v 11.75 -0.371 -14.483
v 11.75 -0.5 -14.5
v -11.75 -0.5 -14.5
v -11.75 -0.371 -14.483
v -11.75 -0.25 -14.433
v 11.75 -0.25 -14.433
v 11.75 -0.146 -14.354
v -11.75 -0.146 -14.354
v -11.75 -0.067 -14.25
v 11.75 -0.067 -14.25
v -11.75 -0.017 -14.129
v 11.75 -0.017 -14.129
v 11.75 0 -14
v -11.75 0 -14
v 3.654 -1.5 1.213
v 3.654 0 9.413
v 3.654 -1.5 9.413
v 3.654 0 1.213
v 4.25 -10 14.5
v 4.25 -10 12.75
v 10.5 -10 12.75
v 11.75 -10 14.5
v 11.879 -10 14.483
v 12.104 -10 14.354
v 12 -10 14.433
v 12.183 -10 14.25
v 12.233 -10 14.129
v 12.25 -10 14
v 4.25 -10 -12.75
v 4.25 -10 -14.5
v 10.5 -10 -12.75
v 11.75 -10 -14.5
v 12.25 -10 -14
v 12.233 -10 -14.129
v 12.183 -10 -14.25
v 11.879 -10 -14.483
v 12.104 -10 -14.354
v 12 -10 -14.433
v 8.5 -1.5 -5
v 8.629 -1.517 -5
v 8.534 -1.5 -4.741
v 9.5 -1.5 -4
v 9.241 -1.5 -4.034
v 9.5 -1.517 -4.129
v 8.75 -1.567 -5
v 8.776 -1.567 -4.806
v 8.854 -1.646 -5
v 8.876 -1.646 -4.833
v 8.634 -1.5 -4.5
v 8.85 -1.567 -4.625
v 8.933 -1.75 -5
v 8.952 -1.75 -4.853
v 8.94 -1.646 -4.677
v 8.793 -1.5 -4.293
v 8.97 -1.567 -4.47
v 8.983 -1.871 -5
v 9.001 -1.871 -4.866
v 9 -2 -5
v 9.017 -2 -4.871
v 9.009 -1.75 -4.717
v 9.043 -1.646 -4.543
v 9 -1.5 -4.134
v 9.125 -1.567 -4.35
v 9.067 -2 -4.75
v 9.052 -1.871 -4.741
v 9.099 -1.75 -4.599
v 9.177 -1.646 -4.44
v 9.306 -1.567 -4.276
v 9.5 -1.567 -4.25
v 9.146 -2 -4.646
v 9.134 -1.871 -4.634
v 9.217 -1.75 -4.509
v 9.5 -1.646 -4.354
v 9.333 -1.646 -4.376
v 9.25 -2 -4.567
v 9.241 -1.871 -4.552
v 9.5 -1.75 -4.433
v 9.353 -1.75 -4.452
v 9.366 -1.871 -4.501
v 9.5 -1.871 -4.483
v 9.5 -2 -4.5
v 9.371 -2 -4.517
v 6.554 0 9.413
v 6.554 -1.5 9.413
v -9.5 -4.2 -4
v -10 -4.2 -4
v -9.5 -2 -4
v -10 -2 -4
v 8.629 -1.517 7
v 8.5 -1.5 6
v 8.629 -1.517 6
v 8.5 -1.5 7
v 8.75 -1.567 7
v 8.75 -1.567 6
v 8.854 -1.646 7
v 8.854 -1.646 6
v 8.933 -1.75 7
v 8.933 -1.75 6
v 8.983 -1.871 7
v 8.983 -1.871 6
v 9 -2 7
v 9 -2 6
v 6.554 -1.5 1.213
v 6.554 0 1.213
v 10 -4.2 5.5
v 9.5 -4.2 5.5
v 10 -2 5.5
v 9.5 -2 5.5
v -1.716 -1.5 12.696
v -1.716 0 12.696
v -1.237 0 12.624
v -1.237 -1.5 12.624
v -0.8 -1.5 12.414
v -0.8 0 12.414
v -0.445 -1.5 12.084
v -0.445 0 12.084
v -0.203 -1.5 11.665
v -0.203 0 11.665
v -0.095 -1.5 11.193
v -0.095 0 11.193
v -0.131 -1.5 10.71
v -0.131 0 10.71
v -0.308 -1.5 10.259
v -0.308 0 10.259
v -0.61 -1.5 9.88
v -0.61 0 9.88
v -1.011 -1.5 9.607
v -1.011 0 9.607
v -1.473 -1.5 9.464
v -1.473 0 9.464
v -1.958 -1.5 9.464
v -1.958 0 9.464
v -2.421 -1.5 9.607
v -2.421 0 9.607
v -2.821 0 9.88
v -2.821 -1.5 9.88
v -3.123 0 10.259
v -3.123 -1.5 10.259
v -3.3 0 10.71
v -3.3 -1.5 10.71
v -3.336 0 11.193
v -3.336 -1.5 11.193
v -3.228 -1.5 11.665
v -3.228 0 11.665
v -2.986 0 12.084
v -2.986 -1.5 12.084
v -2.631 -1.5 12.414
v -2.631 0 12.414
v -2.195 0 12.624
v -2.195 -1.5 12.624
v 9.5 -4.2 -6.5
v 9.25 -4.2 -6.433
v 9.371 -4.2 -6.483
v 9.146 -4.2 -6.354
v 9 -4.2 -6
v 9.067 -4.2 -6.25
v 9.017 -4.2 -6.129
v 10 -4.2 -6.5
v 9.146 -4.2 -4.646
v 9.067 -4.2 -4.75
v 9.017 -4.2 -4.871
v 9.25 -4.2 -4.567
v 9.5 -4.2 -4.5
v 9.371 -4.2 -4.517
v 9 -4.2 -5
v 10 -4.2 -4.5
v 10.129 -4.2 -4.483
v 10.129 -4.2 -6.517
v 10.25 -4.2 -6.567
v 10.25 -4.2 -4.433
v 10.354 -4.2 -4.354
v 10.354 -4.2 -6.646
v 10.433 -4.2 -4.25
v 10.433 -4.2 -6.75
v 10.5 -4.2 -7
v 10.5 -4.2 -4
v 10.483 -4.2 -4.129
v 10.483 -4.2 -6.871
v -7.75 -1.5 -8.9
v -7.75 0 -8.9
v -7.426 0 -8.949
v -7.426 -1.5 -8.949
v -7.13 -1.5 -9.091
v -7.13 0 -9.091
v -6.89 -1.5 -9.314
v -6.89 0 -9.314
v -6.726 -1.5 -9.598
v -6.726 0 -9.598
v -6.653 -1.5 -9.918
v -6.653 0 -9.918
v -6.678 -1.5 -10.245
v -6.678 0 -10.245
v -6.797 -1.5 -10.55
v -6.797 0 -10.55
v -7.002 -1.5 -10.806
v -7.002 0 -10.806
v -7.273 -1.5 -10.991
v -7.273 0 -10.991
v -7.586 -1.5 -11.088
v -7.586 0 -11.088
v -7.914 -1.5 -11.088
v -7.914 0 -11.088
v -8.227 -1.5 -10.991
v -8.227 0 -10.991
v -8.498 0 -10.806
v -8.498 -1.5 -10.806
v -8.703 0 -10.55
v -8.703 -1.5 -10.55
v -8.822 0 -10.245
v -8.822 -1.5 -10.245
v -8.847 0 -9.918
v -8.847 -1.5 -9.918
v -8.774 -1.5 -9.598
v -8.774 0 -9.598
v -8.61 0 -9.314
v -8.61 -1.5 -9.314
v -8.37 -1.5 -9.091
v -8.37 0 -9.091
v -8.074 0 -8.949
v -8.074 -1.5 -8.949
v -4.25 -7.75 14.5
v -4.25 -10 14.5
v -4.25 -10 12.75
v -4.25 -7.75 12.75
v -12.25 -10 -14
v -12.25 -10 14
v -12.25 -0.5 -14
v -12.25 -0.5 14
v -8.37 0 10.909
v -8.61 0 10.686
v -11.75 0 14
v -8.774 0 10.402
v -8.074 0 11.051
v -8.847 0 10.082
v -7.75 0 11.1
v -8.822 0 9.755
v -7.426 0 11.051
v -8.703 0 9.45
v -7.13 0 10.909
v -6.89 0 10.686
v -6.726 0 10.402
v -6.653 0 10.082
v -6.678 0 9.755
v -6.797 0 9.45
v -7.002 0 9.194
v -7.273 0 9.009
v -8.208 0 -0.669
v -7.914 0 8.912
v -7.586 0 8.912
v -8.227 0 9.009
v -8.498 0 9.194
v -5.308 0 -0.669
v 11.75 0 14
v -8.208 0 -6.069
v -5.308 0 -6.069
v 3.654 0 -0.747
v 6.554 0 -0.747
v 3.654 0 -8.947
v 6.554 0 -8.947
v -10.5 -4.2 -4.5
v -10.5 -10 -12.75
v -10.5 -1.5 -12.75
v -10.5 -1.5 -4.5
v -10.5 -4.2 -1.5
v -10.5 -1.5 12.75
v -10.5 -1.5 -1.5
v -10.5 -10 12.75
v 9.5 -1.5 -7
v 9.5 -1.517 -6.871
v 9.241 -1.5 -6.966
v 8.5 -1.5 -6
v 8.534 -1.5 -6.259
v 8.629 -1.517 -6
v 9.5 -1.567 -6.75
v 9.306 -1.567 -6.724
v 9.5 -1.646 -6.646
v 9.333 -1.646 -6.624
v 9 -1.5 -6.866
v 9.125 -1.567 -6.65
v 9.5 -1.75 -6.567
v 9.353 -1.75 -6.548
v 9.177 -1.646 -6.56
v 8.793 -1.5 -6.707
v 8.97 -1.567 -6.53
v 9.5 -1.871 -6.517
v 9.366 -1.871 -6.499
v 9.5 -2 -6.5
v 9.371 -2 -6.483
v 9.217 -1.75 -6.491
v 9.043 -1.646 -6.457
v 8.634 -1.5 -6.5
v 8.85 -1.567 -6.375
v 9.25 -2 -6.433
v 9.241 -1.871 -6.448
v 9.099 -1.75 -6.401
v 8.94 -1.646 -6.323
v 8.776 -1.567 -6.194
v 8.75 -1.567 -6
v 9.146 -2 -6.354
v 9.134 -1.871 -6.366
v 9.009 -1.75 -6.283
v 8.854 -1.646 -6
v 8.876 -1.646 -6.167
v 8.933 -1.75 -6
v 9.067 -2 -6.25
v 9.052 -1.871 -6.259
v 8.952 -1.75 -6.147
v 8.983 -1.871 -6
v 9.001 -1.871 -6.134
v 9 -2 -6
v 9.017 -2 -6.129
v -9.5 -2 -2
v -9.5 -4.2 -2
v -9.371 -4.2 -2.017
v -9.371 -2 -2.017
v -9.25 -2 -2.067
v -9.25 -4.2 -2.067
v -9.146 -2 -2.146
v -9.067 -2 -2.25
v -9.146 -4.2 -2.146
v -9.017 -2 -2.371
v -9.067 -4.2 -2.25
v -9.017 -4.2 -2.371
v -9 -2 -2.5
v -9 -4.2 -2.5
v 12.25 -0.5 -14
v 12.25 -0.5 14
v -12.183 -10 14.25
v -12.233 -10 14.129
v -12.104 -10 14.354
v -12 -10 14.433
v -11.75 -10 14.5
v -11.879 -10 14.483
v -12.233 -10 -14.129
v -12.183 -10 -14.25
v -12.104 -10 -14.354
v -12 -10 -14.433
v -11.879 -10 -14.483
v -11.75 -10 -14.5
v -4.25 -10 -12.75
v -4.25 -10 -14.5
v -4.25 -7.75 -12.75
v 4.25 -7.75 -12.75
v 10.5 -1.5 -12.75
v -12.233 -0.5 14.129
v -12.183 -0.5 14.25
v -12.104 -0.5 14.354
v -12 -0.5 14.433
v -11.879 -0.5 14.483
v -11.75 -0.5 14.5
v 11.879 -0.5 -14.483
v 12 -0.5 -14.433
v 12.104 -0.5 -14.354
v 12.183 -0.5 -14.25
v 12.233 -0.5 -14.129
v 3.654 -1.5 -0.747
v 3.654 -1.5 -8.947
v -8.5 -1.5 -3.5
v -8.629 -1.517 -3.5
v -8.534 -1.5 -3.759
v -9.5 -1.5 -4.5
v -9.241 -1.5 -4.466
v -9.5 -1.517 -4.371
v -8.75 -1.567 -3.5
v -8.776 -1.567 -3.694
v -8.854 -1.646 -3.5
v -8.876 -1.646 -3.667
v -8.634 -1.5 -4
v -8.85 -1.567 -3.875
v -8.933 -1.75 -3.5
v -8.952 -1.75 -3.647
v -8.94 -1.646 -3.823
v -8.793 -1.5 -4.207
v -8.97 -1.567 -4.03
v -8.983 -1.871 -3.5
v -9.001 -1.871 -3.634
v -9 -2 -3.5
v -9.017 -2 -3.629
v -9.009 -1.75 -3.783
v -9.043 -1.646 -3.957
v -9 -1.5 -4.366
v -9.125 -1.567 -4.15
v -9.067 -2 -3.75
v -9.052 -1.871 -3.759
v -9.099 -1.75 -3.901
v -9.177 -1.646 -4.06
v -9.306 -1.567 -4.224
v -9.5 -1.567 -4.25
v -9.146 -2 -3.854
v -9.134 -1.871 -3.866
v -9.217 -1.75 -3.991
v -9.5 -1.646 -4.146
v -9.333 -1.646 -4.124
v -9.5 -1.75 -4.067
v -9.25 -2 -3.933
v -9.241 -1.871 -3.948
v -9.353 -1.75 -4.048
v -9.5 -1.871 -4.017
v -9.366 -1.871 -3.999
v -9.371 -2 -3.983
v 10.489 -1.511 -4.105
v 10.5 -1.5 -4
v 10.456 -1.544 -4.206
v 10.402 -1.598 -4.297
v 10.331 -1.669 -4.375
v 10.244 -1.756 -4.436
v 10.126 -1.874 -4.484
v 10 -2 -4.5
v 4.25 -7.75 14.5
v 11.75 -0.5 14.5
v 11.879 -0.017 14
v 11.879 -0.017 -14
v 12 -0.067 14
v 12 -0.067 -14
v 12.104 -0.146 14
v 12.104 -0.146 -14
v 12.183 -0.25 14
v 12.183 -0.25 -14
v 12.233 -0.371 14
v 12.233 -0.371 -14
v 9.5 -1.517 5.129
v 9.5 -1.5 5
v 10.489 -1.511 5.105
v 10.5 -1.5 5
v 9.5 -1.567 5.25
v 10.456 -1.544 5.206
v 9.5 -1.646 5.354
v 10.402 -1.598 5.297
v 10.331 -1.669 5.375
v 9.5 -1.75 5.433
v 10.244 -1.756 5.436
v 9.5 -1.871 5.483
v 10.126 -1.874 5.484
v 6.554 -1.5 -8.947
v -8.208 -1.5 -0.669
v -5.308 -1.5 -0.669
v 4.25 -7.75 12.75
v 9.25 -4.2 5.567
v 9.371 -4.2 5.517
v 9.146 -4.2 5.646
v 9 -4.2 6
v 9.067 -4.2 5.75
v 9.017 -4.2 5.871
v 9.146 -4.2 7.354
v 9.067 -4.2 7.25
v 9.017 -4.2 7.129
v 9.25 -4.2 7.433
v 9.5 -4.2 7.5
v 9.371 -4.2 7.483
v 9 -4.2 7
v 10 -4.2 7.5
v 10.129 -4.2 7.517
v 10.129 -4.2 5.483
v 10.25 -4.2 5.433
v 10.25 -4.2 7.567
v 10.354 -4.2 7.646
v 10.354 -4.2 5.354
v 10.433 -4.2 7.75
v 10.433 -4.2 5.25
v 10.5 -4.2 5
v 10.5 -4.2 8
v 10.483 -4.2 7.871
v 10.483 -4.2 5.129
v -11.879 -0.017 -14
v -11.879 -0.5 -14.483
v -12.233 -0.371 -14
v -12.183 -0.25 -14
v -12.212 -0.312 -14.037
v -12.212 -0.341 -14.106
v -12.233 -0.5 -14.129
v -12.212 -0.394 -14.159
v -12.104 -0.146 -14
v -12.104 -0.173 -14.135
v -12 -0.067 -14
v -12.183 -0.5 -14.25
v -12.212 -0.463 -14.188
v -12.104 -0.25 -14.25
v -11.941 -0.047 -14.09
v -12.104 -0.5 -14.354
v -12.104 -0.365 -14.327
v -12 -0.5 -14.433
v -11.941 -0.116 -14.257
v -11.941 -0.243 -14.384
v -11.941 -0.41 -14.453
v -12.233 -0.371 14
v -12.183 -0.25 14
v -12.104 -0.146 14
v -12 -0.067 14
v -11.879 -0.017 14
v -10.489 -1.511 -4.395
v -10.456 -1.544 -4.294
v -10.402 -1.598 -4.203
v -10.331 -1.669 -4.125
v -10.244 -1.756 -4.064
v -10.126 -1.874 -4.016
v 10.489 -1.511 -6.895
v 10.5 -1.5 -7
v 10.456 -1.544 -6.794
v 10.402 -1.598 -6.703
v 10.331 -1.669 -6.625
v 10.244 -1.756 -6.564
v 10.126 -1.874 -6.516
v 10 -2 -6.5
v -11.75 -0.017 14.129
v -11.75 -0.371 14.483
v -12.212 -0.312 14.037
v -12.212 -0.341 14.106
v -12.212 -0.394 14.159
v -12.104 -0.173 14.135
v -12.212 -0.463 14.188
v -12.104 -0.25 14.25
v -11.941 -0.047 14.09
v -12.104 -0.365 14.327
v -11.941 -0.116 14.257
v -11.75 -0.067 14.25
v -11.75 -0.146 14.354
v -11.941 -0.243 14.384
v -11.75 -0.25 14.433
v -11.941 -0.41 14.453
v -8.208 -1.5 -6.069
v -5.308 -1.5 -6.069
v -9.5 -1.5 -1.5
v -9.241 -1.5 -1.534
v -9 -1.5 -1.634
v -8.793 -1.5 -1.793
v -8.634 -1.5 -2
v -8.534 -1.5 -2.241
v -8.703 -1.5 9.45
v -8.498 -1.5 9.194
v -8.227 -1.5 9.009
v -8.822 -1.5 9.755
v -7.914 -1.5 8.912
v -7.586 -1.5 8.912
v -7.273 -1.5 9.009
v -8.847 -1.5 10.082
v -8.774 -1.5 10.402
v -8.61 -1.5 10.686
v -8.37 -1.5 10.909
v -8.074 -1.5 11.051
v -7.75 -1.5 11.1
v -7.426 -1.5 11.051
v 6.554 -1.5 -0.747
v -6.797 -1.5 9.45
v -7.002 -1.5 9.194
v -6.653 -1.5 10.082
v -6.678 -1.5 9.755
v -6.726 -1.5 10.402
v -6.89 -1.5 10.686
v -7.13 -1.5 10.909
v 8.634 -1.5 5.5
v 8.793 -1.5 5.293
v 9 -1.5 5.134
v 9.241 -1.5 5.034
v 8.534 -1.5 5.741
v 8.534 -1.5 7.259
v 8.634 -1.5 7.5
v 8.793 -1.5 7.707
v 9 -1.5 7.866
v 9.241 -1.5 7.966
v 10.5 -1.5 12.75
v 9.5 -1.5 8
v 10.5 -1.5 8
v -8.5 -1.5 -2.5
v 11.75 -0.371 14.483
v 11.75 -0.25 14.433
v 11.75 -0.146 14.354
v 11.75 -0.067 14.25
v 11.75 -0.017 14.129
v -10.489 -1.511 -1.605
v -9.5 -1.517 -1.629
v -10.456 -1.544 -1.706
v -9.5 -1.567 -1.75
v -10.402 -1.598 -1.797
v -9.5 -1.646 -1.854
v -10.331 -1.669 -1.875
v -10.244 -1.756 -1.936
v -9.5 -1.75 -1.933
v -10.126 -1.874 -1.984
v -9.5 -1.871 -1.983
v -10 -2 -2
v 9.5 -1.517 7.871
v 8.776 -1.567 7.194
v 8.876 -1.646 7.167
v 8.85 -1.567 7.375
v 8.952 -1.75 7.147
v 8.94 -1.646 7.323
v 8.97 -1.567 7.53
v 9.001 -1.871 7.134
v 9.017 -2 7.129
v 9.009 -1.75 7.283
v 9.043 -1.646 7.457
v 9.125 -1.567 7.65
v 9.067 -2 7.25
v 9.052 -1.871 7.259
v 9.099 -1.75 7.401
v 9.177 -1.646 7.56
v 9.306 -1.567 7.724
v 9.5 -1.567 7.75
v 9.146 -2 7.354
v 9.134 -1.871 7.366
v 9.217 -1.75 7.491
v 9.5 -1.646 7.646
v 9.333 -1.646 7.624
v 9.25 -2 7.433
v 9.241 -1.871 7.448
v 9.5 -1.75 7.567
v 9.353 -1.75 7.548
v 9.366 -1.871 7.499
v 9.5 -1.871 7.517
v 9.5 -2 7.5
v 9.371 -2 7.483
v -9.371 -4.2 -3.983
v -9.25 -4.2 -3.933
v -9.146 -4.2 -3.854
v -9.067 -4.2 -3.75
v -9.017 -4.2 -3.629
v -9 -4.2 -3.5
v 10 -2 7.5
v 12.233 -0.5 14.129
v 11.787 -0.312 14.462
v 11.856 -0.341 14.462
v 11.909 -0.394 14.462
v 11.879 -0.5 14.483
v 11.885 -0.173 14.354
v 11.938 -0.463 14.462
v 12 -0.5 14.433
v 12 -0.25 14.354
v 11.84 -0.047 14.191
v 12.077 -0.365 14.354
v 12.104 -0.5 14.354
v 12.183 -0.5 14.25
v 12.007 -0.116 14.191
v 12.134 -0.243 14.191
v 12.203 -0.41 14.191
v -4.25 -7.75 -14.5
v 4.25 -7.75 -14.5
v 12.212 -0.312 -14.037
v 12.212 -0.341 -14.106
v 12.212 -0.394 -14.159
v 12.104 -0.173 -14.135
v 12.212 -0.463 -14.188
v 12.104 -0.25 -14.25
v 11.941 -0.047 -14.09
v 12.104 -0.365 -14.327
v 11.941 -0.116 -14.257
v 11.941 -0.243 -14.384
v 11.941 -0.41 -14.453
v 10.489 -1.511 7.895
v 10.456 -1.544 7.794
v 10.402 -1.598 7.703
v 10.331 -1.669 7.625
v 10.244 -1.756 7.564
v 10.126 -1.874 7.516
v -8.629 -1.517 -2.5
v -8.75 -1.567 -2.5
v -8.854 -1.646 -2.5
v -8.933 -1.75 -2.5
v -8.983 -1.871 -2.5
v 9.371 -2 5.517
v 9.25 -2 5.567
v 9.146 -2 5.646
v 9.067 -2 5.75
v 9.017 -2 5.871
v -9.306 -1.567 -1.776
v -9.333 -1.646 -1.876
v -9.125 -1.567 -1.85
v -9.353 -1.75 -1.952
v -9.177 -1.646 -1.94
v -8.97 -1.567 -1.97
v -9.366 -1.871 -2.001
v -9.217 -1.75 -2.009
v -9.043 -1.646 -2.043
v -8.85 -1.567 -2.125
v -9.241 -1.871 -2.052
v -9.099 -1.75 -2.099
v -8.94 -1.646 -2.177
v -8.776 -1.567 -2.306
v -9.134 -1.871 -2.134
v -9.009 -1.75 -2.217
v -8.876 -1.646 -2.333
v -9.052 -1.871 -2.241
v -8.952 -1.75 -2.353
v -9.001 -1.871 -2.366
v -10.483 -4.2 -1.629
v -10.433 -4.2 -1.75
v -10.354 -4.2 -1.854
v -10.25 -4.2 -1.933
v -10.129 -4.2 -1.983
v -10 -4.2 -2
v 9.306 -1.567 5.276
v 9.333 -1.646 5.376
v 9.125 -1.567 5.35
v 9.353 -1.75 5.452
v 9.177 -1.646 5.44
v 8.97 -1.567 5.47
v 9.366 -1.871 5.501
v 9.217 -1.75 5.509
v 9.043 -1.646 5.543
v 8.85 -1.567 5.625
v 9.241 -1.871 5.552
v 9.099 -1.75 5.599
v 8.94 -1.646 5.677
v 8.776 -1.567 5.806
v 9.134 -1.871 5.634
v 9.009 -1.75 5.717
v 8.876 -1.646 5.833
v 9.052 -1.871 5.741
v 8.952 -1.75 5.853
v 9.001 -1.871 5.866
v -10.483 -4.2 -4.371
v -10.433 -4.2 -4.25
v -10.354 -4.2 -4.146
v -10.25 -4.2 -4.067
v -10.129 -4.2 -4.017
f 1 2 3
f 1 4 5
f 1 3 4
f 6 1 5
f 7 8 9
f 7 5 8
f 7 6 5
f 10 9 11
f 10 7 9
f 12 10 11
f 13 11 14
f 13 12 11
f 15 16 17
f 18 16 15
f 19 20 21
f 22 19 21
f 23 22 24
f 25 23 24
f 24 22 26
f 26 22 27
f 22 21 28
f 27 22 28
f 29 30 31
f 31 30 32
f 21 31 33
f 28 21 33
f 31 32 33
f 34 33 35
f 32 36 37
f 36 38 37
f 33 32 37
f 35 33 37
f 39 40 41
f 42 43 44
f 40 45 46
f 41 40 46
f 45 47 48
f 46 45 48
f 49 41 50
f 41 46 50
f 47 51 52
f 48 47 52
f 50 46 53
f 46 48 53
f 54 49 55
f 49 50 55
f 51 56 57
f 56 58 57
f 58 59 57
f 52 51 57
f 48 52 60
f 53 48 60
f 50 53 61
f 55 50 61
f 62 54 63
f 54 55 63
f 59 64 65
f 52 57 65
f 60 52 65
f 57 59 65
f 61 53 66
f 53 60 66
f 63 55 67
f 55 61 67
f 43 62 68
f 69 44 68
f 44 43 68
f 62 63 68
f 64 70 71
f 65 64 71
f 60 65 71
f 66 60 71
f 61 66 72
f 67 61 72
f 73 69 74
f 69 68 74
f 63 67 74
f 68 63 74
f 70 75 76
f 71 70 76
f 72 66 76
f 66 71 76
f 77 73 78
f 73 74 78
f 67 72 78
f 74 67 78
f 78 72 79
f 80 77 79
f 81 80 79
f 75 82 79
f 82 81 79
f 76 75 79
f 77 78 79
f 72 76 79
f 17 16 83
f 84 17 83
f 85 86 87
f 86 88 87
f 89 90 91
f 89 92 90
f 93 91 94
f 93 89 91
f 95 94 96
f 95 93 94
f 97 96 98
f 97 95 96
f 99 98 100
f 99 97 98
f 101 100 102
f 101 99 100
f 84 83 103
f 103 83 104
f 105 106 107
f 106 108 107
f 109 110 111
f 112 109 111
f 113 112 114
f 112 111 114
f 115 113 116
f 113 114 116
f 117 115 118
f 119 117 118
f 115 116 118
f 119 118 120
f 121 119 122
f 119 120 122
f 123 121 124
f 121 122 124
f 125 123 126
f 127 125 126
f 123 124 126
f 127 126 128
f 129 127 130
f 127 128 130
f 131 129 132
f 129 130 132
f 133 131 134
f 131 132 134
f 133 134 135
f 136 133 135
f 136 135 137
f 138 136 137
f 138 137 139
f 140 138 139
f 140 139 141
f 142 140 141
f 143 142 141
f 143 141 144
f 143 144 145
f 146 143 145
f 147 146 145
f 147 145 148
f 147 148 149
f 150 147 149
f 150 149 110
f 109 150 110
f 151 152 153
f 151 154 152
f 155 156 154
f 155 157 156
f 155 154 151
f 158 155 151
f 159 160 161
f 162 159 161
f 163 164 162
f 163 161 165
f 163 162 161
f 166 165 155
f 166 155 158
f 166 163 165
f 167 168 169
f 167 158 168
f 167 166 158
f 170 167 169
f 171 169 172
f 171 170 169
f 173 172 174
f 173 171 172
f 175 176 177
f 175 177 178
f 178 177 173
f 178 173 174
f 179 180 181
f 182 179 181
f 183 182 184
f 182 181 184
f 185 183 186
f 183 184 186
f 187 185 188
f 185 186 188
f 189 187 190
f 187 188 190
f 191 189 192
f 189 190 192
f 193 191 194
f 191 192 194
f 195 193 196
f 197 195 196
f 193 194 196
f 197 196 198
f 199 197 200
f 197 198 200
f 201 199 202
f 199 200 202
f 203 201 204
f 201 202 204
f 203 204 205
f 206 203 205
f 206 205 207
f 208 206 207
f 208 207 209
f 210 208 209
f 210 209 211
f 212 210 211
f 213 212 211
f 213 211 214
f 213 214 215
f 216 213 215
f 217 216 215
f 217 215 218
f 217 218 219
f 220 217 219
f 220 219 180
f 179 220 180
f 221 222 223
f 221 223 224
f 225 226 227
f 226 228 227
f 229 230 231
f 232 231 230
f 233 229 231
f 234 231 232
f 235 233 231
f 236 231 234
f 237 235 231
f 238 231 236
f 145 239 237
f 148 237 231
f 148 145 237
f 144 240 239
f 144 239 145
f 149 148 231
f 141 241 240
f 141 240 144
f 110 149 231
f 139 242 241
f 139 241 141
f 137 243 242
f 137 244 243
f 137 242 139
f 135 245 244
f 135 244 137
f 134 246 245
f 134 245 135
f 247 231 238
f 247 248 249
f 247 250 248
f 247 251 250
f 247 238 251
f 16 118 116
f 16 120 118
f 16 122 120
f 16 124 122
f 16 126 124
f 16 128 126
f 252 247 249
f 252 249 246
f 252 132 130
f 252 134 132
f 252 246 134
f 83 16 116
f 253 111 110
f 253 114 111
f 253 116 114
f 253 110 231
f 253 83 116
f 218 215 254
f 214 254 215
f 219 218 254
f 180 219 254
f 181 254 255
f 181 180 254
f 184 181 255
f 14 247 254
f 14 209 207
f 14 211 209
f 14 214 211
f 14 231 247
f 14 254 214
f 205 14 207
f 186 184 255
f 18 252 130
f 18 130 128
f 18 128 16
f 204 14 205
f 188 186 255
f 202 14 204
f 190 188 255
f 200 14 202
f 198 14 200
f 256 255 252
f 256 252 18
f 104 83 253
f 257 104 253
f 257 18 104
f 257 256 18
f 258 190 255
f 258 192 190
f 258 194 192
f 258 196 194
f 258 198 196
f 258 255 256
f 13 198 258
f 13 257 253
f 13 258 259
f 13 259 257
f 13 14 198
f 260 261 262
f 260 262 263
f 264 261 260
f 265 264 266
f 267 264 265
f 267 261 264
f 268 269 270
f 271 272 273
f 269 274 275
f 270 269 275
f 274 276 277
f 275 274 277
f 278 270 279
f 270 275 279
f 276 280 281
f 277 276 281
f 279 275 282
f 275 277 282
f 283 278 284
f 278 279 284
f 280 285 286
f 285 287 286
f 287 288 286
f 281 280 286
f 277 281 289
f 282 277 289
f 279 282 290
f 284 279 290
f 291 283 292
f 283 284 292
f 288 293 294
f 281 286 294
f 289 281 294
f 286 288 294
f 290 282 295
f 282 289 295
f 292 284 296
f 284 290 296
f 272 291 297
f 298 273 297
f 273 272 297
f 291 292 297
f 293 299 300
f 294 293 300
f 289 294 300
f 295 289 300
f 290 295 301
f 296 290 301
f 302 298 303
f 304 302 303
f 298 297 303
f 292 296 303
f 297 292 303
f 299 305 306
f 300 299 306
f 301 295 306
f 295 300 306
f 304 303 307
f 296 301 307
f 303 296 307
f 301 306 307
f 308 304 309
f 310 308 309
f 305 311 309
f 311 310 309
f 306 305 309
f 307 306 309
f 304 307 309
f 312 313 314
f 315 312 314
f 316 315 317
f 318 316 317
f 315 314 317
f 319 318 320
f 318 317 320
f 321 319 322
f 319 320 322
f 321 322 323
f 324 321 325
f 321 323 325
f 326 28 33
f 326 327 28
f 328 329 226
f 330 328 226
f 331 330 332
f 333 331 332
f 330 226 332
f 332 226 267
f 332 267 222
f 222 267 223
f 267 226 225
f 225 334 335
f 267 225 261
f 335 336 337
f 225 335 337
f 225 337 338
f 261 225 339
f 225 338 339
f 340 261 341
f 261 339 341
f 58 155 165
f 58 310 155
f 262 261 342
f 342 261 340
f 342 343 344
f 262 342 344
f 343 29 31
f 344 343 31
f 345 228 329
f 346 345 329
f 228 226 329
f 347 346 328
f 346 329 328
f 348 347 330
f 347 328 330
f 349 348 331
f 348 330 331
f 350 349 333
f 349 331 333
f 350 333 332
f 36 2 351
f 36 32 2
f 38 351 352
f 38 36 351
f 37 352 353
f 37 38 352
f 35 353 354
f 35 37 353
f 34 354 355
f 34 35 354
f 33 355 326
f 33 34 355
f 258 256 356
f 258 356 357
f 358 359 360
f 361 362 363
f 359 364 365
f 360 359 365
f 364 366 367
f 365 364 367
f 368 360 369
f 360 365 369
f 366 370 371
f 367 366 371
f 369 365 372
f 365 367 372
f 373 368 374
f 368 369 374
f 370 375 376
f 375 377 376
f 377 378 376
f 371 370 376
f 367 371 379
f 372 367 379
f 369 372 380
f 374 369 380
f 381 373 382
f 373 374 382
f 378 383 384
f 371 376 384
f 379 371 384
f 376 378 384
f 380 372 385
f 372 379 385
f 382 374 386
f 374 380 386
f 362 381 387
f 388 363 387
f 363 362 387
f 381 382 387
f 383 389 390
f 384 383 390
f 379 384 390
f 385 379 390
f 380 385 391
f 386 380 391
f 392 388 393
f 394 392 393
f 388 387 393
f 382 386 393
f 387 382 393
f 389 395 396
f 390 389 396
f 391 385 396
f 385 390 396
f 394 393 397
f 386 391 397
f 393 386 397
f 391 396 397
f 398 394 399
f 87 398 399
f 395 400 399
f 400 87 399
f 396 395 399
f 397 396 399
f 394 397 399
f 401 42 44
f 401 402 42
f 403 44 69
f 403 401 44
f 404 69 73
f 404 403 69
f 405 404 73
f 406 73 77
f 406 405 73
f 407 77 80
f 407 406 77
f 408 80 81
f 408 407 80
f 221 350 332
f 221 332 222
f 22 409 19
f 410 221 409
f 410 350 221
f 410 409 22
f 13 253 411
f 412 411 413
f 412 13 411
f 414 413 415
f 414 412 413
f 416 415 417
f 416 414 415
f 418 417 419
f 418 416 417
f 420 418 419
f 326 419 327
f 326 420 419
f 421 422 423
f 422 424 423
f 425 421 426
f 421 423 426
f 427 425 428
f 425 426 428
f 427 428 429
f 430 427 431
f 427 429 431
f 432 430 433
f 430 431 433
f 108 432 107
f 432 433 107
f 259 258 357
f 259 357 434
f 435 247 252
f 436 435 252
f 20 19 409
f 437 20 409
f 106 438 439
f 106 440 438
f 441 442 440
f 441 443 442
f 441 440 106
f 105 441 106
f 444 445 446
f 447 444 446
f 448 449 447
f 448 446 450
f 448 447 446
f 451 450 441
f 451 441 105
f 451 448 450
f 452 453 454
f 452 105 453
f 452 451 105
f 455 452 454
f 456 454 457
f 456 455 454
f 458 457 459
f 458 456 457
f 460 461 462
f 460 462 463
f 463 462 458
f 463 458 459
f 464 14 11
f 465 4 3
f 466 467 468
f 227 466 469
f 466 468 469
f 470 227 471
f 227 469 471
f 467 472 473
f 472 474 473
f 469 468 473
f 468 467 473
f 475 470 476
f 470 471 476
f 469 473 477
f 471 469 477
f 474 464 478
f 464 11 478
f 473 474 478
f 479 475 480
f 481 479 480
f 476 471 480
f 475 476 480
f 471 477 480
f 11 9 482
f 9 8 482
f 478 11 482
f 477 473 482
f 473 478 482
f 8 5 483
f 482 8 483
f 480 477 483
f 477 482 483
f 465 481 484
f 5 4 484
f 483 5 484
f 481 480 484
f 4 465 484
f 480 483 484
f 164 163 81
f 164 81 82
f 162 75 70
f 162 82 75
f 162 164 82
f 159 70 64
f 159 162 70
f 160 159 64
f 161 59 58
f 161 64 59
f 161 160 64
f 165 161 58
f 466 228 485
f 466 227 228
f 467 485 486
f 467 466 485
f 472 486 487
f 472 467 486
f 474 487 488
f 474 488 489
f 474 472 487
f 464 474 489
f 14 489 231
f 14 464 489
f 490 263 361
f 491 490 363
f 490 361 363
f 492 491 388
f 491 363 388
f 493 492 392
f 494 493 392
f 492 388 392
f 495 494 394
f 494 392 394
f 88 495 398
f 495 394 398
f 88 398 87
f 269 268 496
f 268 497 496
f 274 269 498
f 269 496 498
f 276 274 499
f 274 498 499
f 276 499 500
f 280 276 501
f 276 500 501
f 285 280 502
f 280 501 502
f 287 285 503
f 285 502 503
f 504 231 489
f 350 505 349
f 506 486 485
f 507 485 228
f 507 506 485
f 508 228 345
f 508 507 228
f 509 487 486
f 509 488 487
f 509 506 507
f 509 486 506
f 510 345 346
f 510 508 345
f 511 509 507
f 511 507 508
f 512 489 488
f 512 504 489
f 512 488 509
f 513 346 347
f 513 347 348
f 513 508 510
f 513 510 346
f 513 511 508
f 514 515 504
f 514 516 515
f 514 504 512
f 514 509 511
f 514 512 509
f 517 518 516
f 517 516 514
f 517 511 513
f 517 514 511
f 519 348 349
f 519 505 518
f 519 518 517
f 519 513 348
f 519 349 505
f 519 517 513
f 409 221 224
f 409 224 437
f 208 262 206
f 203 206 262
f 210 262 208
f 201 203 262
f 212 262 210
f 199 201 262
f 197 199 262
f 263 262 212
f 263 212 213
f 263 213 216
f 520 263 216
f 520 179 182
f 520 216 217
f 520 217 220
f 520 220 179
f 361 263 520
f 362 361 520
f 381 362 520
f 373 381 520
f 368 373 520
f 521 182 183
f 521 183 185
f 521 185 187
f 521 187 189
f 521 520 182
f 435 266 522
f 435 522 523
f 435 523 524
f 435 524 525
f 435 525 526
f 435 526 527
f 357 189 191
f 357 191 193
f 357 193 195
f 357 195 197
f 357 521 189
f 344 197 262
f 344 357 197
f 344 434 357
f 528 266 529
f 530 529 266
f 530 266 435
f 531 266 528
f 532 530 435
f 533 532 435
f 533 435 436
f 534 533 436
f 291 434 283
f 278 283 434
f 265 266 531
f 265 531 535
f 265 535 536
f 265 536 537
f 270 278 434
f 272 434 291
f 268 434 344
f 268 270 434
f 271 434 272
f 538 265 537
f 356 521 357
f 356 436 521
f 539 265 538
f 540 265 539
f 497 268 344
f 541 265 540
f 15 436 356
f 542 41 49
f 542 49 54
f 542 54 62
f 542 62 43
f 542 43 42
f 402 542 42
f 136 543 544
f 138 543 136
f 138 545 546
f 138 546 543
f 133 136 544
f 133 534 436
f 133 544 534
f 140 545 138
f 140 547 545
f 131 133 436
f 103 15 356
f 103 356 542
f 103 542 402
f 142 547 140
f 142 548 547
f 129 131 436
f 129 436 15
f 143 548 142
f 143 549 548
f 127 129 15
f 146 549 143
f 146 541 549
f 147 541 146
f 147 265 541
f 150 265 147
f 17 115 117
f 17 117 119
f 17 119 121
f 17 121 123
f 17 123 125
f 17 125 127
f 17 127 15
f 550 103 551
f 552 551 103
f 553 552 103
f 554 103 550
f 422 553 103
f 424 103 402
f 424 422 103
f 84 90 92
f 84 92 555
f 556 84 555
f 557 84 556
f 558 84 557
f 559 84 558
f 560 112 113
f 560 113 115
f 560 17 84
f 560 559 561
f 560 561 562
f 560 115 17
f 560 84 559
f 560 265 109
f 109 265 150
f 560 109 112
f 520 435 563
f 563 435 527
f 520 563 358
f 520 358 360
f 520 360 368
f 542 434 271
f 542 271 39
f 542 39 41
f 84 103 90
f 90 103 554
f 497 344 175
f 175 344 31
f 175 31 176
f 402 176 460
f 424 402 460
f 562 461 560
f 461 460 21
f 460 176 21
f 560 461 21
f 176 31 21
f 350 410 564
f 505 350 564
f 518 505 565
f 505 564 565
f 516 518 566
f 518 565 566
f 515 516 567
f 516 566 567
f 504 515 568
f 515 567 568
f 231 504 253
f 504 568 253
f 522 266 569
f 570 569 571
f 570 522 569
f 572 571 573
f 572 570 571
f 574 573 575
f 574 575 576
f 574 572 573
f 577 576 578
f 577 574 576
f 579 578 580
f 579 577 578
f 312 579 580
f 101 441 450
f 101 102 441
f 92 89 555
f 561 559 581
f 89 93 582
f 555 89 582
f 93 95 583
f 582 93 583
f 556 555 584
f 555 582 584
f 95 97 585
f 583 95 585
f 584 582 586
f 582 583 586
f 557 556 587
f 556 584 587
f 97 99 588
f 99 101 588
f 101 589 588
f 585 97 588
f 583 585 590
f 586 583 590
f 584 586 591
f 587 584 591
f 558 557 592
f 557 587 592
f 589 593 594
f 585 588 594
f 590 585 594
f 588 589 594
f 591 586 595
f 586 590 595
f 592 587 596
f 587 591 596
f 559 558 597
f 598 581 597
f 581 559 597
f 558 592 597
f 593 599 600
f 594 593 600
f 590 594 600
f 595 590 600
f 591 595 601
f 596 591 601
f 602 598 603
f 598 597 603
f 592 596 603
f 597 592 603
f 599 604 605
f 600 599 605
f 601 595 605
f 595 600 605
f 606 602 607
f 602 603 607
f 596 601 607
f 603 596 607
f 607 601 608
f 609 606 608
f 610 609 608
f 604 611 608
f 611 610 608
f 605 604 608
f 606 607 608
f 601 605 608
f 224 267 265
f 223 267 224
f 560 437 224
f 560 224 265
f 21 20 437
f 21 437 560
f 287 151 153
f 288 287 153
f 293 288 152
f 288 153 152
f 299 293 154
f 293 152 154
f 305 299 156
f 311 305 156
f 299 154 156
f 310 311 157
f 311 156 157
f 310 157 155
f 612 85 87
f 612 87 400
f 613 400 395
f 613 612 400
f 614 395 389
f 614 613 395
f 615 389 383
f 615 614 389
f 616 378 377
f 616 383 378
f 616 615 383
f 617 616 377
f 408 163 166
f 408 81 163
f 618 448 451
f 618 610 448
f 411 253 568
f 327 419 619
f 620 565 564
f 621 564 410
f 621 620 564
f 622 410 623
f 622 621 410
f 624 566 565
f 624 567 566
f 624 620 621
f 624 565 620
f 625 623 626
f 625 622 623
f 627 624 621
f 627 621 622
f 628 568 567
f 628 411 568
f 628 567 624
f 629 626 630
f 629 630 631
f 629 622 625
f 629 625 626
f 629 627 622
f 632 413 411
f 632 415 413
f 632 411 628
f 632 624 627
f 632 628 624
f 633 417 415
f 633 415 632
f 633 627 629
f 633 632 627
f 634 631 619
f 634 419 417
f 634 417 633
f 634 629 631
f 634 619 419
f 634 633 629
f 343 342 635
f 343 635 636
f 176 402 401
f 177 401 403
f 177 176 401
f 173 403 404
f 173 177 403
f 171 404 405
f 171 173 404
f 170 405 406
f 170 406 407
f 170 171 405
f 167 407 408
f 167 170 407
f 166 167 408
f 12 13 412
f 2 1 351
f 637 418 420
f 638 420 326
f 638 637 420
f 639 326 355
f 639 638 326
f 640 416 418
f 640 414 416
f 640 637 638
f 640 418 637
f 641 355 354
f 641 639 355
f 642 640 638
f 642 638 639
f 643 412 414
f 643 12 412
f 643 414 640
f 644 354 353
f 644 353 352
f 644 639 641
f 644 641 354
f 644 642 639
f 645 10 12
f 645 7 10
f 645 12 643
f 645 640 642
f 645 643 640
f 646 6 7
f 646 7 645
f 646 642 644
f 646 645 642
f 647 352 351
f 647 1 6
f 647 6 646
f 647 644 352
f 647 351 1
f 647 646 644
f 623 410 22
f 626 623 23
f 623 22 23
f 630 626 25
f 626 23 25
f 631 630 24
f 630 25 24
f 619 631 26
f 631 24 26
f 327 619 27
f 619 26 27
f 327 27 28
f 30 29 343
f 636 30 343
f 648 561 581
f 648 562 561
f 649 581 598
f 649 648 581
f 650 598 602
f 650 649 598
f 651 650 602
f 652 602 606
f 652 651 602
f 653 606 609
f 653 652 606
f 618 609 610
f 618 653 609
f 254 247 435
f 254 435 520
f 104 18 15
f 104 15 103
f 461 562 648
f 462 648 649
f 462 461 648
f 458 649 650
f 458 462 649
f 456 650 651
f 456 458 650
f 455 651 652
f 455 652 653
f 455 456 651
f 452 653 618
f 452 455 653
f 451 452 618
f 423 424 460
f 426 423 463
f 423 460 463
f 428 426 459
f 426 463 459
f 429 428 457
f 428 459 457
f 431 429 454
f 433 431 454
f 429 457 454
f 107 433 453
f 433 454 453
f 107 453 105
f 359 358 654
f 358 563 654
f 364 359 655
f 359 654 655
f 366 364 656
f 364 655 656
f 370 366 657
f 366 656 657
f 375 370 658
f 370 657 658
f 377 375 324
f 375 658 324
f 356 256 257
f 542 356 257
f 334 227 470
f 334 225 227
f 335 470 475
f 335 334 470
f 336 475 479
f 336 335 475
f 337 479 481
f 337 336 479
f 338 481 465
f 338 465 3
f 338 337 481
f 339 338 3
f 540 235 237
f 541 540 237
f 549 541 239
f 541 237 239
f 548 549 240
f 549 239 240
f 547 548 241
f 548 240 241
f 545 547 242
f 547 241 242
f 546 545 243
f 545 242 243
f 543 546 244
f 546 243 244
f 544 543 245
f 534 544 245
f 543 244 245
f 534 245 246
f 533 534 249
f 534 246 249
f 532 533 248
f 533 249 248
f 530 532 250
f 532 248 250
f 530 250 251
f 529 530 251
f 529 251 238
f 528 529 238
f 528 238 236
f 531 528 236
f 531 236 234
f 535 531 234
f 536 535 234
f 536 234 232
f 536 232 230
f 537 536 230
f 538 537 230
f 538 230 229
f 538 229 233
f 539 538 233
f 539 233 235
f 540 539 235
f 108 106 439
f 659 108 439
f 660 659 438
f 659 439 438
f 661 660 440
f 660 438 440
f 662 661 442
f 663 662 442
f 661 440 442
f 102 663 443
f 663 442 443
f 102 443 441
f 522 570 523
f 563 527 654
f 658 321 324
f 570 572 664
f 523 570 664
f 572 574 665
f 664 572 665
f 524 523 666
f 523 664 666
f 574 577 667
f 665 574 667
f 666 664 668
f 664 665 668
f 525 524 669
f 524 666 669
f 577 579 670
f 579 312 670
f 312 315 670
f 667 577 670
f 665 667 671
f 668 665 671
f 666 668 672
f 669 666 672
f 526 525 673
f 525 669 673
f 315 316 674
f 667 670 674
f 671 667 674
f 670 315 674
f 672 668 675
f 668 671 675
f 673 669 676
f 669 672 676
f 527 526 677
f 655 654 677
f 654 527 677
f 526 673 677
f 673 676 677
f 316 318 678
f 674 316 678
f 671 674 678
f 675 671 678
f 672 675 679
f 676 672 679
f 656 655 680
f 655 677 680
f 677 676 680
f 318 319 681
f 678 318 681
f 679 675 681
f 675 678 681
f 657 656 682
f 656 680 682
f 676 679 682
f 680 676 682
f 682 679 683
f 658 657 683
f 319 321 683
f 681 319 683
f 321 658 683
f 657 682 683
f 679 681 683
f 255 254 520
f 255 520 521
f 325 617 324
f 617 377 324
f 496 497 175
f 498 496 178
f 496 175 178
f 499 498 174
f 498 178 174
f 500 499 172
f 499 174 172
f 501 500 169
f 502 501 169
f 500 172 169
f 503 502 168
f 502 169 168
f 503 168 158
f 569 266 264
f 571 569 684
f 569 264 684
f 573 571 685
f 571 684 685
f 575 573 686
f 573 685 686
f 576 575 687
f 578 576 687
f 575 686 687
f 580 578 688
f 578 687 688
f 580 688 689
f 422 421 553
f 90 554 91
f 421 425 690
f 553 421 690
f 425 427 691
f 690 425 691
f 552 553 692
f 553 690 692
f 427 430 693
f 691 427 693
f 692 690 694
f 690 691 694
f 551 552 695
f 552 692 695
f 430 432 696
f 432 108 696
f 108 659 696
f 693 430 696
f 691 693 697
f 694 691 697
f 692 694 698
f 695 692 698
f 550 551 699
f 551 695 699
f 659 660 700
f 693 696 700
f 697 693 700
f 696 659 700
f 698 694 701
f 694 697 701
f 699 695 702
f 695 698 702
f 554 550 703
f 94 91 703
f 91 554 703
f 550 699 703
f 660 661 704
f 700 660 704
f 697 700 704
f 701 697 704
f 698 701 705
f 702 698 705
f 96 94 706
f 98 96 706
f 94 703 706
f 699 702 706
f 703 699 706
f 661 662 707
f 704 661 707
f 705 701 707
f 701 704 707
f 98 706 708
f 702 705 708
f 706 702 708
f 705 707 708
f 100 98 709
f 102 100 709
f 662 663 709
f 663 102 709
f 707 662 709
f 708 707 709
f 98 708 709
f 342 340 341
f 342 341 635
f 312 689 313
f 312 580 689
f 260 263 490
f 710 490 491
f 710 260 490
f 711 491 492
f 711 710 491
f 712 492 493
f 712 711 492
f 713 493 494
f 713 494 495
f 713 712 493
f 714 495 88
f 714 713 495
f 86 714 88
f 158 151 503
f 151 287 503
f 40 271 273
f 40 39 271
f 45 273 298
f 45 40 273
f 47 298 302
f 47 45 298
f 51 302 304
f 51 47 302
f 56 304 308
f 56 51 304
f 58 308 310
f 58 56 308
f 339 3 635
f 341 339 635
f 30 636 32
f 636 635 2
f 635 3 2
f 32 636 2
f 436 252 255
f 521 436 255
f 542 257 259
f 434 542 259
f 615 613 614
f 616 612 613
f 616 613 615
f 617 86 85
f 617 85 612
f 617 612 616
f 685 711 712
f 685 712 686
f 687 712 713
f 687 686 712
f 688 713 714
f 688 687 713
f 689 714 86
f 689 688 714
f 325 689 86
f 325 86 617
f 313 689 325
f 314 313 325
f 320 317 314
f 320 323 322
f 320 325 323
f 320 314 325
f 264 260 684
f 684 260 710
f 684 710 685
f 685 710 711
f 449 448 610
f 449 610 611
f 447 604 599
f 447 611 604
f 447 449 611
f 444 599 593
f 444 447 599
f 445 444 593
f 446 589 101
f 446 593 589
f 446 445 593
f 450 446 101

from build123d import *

# Parameters (mm, degrees)
SKETCH2_W           = 24.5
SKETCH2_H           = 29
BOSS_EXTRUDE1_DEPTH = 10
SKETCH3_W           = 21
SKETCH3_H           = 25.5
CUT_EXTRUDE1_DEPTH  = 8.5
SKETCH4_R           = 1.1
SKETCH4_R_2         = 1.625
SKETCH4_W           = 2.9
SKETCH4_H           = 5.4
SKETCH4_H_2         = 8.2
CUT_EXTRUDE2_DEPTH  = 22.454894546
SKETCH5_W           = 8.5
SKETCH5_H           = 2.25
CUT_EXTRUDE3_DEPTH  = 34.031235218
FILLET1_R           = 0.5
SKETCH6_W           = 1.5
SKETCH6_H           = 2
BOSS_EXTRUDE2_DEPTH = 2.7
FILLET2_R           = 0.5


with BuildPart() as part:
    # Sketch2 → Boss-Extrude1 (new body)
    with BuildSketch(Plane(origin=(0, 0, 0), x_dir=(1, 0, 0), z_dir=(0, 1, 0))):
        Rectangle(SKETCH2_W, SKETCH2_H)
    extrude(amount=-BOSS_EXTRUDE1_DEPTH)

    # Sketch3 → Cut-Extrude1 (cut)
    with BuildSketch(Plane.XZ.offset(10)):
        Rectangle(SKETCH3_W, SKETCH3_H)
    extrude(amount=-CUT_EXTRUDE1_DEPTH, mode=Mode.SUBTRACT)

    # Sketch4 → Cut-Extrude2 (cut, through all)
    with BuildSketch(Plane(origin=(0, 0, 0), x_dir=(1, 0, 0), z_dir=(0, 1, 0))):
        with Locations(Location((-7.75, -10, 0), (0, 0, 270))):
            Circle(SKETCH4_R)
        with Locations(Location((-7.75, 10, 0), (0, 0, 270))):
            Circle(SKETCH4_R)
        with Locations(Location((-1.7156, -11.0712, 0), (0, 0, 270))):
            Circle(SKETCH4_R_2)
        with Locations((-6.7576, 3.3688)):
            Rectangle(SKETCH4_W, SKETCH4_H)
        with Locations((5.1042, 4.84677)):
            Rectangle(SKETCH4_W, SKETCH4_H_2)
        with Locations((5.1042, -5.31323)):
            Rectangle(SKETCH4_W, SKETCH4_H_2)
    extrude(amount=-CUT_EXTRUDE2_DEPTH, mode=Mode.SUBTRACT)

    # Sketch5 → Cut-Extrude3 (cut, through all)
    with BuildSketch(Plane.XY.offset(14.5)):
        with Locations((0, -8.875)):
            Rectangle(SKETCH5_W, SKETCH5_H)
    extrude(amount=-CUT_EXTRUDE3_DEPTH, mode=Mode.SUBTRACT)

    # Fillet1
    fillet1_edges = [part.edges().sort_by_distance(p)[0] for p in [
        (0, 0, -14.5),
        (12.25, 0, 0),
        (0, 0, 14.5),
        (-12.25, 0, 0),
        (-12.25, -5, -14.5),
        (12.25, -5, -14.5),
        (12.25, -5, 14.5),
        (-12.25, -5, 14.5),
    ]]
    fillet(fillet1_edges, radius=FILLET1_R)

    # Sketch6 → Boss-Extrude2 (add)
    with BuildSketch(Plane.XZ.offset(1.5)):
        with Locations((-9.75, -3)):
            Rectangle(SKETCH6_W, SKETCH6_H)
        with Locations((9.75, 6.5)):
            Rectangle(SKETCH6_W, SKETCH6_H)
        with Locations((9.75, -5.5)):
            Rectangle(SKETCH6_W, SKETCH6_H)
    extrude(amount=BOSS_EXTRUDE2_DEPTH)

    # Fillet2
    fillet2_edges = [part.edges().sort_by_distance(p)[0] for p in [
        (-9.75, -1.5, -2),
        (9.75, -1.5, -6.5),
        (9.75, -1.5, 5.5),
        (-9, -1.5, -3),
        (9, -1.5, -5.5),
        (9, -1.5, 6.5),
        (-9.75, -1.5, -4),
        (-10.5, -2.85, -4),
        (-9, -2.85, -4),
        (-9, -2.85, -2),
        (-10.5, -2.85, -2),
        (9.75, -1.5, -4.5),
        (10.5, -2.85, -4.5),
        (9, -2.85, -4.5),
        (9, -2.85, -6.5),
        (10.5, -2.85, -6.5),
        (9.75, -1.5, 7.5),
        (10.5, -2.85, 7.5),
        (9, -2.85, 7.5),
        (9, -2.85, 5.5),
        (10.5, -2.85, 5.5),
    ]]
    fillet(fillet2_edges, radius=FILLET2_R)


solid = part.part
